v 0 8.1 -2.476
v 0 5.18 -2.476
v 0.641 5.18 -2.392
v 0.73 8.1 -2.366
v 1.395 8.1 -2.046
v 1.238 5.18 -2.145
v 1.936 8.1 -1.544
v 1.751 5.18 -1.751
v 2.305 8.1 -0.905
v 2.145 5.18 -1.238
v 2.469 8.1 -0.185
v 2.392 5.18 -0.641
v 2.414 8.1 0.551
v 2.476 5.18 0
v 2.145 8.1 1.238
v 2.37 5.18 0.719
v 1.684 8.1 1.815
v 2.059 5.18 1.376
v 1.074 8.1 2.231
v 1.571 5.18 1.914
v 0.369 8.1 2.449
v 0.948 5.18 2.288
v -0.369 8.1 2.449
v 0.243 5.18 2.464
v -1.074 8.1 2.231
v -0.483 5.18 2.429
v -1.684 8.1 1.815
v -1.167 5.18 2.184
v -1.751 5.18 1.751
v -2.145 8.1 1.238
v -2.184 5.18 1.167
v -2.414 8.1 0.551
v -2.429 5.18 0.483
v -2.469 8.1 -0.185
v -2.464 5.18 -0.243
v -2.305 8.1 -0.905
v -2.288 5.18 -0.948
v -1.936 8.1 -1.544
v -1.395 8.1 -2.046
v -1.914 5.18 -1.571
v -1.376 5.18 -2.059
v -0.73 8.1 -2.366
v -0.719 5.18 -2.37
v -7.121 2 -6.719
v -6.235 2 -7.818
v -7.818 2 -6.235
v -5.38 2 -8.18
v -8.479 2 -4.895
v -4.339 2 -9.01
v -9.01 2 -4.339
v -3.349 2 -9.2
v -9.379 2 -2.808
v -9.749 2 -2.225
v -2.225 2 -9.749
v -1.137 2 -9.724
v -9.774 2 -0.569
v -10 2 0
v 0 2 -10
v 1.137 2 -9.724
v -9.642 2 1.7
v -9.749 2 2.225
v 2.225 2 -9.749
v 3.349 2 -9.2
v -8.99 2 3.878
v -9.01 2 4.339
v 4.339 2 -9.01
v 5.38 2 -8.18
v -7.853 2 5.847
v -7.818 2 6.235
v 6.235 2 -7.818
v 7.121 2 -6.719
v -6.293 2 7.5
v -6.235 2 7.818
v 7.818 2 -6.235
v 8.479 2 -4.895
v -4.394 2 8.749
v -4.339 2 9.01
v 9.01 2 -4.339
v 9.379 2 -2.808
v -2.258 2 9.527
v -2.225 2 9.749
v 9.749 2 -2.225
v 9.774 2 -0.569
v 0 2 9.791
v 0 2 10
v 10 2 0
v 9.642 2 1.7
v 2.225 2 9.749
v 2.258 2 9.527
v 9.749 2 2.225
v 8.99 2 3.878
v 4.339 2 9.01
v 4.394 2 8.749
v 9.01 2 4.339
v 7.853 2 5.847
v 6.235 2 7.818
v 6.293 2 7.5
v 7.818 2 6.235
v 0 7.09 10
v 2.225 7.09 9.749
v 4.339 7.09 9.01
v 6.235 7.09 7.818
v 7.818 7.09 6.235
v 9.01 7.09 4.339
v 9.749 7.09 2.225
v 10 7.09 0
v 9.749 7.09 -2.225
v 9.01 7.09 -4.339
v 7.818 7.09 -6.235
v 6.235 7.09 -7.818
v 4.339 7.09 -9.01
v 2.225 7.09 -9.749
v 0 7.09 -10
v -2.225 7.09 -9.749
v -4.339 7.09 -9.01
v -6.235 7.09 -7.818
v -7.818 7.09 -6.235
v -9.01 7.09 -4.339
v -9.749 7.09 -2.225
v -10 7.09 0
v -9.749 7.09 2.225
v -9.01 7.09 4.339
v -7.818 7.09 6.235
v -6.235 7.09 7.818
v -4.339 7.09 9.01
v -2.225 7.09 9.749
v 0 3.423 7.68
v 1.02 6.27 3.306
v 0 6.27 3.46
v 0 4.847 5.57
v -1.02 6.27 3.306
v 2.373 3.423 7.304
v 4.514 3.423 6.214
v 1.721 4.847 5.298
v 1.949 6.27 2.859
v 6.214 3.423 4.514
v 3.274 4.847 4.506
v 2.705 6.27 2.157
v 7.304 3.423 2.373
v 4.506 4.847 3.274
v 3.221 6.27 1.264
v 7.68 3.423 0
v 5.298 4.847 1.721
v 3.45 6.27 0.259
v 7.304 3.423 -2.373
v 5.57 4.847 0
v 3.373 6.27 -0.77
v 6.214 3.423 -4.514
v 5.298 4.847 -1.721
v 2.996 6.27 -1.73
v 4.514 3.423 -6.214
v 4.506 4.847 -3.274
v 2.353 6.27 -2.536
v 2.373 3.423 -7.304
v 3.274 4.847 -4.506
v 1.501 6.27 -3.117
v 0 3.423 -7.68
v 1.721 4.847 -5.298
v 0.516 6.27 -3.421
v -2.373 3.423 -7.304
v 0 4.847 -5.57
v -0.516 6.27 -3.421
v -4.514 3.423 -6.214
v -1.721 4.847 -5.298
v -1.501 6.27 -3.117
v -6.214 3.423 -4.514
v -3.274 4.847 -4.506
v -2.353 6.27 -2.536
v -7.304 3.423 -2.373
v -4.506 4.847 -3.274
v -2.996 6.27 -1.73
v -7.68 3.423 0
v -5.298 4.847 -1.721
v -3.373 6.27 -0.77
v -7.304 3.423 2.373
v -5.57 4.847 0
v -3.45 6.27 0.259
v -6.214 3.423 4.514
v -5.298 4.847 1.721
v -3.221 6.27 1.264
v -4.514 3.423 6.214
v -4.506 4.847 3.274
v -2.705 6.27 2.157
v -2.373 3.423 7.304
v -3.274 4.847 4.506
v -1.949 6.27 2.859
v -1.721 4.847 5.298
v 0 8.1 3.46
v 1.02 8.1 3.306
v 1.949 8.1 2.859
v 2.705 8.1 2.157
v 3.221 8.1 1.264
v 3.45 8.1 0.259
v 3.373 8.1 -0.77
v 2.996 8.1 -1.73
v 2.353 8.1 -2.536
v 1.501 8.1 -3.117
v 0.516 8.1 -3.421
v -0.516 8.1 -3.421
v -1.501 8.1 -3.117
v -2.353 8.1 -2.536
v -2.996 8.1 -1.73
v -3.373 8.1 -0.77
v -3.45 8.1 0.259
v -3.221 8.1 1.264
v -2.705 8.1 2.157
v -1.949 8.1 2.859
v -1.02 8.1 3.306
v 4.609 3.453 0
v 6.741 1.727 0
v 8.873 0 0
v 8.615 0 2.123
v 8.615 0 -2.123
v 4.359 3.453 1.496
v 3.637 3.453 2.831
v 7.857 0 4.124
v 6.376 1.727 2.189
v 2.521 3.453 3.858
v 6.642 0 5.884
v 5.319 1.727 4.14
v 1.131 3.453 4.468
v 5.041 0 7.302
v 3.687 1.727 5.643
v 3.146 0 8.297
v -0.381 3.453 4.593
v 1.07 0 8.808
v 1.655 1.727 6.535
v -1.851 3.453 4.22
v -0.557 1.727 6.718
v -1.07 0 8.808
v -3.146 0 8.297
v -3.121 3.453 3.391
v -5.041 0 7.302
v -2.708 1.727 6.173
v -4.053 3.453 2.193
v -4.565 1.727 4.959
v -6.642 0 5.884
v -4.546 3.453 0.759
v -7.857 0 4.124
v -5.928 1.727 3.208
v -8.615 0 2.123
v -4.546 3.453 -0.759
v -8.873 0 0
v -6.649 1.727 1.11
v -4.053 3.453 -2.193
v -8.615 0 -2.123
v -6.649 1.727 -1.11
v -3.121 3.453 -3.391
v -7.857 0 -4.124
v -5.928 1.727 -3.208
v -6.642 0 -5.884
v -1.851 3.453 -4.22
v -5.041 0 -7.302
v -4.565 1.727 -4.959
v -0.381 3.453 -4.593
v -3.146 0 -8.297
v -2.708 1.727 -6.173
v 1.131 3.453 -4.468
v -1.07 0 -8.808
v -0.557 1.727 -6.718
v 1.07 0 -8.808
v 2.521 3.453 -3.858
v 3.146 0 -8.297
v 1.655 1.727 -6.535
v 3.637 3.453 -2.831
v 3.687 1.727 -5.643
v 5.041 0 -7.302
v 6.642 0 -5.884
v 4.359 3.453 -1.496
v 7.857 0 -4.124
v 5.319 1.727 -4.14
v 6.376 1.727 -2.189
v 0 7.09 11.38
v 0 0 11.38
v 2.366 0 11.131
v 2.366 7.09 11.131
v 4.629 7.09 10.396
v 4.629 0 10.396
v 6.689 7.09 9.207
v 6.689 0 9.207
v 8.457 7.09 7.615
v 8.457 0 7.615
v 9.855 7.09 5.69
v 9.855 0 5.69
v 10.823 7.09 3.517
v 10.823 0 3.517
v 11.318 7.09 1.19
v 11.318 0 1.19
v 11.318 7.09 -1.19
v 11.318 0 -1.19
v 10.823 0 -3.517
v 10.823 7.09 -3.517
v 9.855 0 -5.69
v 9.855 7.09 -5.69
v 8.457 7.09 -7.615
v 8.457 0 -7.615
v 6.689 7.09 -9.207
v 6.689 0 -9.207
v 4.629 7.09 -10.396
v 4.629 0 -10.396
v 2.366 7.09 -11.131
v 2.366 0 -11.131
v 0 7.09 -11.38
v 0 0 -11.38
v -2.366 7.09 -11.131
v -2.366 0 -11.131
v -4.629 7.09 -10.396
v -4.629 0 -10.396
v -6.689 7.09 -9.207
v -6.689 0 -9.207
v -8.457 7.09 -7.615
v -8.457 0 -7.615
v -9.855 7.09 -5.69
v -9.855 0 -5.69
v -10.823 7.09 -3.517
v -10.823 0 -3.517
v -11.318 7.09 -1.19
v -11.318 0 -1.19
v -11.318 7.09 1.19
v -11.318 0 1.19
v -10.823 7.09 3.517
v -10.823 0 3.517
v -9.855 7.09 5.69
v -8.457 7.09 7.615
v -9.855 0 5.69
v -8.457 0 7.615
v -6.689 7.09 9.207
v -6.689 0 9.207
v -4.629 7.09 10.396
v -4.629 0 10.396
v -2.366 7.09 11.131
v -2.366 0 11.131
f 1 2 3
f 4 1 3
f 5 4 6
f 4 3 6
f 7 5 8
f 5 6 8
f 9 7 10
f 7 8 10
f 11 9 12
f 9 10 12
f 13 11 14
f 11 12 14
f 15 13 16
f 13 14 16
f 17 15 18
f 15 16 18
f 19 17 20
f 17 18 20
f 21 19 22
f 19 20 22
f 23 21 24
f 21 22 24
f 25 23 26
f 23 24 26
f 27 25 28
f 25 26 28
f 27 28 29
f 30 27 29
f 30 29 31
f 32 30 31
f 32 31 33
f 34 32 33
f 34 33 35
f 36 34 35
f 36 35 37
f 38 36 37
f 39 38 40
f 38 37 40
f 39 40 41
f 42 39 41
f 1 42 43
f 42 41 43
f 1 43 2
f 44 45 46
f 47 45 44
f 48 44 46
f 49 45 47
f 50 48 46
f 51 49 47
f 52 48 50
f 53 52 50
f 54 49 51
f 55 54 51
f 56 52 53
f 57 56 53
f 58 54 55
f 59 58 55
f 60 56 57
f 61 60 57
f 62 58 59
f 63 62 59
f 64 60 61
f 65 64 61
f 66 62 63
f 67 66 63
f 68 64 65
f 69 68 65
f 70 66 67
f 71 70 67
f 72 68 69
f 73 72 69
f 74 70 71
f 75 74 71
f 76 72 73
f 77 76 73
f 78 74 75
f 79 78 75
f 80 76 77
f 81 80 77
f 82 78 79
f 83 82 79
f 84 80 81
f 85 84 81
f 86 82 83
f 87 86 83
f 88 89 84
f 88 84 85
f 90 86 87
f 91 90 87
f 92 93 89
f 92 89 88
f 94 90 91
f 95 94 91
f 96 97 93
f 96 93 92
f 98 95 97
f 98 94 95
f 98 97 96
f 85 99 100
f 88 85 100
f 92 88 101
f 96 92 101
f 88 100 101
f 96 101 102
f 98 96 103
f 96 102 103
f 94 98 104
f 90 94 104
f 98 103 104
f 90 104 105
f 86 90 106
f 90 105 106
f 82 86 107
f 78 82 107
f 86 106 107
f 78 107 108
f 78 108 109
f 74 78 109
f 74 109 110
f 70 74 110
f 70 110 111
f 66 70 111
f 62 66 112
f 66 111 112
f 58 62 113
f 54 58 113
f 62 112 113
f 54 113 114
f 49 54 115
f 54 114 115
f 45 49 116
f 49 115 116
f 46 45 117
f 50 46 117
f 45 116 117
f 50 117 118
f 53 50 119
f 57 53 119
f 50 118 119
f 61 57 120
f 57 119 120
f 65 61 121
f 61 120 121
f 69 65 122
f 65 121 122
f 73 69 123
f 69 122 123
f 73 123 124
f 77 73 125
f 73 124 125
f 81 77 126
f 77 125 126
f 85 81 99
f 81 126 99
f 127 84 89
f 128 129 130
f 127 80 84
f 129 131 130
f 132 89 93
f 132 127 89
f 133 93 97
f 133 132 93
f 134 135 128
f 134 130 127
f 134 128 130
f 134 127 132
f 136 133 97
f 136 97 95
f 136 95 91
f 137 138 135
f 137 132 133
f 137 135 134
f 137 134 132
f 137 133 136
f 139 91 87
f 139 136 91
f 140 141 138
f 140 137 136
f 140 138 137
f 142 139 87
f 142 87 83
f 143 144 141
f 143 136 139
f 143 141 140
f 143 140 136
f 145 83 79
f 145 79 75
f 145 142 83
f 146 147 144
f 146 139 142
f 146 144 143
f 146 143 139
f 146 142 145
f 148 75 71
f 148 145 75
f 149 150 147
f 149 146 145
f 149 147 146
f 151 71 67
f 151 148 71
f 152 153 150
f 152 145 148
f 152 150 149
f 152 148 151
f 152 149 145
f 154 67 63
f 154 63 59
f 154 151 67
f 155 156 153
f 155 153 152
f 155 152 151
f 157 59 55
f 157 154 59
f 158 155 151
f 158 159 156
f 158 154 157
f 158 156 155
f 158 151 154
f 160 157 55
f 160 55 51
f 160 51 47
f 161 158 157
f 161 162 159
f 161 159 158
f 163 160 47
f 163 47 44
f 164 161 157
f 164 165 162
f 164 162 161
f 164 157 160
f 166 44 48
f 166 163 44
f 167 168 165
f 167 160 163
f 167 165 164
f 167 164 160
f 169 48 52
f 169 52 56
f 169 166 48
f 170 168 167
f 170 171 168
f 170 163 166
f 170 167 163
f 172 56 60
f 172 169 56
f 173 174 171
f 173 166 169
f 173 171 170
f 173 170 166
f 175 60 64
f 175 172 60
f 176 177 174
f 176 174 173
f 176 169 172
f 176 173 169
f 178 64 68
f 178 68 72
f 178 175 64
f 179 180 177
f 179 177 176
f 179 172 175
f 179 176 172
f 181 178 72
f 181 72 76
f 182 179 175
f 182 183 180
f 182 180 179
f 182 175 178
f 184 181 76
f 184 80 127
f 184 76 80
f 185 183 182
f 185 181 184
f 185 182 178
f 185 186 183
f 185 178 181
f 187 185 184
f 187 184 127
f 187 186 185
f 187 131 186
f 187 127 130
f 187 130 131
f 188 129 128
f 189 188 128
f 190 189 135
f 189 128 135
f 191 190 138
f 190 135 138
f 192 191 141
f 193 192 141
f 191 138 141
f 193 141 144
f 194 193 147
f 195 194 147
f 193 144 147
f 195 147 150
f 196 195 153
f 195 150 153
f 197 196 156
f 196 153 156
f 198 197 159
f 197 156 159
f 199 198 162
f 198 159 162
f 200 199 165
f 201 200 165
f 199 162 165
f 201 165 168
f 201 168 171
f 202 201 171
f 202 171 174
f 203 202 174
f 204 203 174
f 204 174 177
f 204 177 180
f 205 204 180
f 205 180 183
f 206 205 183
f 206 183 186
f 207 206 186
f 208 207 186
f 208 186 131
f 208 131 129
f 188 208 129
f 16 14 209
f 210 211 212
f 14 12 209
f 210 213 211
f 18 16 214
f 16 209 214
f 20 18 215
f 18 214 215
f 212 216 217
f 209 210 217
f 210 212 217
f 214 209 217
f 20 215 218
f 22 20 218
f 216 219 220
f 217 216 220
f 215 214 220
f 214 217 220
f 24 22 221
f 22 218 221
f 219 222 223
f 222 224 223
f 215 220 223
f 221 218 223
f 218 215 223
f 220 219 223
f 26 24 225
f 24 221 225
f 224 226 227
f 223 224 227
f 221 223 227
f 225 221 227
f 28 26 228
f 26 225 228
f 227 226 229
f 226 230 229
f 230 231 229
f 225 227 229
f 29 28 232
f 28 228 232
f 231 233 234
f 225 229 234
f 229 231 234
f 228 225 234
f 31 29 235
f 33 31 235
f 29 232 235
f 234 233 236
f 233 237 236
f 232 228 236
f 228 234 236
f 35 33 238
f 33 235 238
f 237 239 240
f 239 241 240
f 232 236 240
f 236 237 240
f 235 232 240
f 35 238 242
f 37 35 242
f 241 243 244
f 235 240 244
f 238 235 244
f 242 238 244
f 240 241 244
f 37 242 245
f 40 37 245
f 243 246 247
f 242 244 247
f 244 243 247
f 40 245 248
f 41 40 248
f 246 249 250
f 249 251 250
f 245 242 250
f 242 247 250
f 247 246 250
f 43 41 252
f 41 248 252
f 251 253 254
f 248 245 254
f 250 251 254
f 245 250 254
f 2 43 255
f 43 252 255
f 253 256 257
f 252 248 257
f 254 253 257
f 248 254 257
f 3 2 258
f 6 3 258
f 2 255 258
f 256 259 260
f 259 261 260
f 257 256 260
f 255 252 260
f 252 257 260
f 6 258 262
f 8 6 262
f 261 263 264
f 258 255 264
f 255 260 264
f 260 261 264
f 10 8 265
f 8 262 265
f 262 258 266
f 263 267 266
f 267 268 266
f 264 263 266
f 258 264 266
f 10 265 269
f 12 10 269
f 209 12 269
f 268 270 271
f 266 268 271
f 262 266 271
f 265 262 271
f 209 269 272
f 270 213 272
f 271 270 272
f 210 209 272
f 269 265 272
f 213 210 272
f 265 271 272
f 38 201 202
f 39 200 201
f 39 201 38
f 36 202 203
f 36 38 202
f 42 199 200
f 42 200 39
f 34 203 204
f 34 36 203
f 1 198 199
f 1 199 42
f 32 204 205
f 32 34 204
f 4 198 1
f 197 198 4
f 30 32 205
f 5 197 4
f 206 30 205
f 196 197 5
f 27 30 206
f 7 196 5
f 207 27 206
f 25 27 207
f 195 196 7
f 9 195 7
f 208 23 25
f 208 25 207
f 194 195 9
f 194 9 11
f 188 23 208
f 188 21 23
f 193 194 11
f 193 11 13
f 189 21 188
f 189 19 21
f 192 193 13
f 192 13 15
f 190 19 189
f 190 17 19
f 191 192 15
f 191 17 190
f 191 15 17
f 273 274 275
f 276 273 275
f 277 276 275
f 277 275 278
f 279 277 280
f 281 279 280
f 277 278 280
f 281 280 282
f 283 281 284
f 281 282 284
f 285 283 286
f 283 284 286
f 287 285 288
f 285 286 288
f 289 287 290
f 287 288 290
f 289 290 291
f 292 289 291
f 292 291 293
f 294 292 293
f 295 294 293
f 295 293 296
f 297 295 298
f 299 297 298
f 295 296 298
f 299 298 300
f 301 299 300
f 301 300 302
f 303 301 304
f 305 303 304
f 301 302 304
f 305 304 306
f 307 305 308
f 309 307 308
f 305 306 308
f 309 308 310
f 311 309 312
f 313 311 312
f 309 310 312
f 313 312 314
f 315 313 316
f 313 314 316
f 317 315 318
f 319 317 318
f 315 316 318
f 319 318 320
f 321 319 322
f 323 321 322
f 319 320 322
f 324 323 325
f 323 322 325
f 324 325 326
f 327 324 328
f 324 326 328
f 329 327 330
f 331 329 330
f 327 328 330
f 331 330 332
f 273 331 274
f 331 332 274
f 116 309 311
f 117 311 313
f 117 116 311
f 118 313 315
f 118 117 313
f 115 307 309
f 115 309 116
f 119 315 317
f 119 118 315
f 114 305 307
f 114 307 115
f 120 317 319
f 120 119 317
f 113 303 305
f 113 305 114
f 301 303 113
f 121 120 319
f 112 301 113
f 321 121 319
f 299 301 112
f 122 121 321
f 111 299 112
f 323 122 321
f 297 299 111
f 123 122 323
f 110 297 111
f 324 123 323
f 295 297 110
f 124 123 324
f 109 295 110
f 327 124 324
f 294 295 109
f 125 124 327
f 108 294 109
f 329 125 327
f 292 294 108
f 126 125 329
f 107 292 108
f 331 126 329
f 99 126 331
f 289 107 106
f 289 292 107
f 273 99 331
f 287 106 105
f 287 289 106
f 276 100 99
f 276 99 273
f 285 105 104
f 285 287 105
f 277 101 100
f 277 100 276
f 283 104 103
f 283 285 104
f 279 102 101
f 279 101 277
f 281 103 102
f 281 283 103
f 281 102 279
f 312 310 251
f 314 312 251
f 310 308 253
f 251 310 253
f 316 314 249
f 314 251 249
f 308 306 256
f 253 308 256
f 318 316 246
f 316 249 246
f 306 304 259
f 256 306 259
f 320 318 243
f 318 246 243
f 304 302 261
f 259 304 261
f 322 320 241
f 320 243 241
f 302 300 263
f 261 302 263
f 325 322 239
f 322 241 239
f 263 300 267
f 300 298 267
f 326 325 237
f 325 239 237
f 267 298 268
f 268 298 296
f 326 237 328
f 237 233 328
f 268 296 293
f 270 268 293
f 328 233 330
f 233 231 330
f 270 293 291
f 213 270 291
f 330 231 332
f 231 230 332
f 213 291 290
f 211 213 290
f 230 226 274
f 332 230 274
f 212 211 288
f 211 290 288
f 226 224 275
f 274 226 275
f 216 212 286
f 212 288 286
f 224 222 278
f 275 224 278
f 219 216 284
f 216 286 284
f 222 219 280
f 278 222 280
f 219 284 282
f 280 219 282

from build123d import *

# Parameters (mm, degrees)
SKETCH_1_R          = 11.38
EXTRUDE_1_DEPTH     = 7.09
SKETCH_2_R          = 10
CUT_EXTRUDE_1_DEPTH = 5.09
SKETCH_3_R          = 3.46
EXTRUDE_2_DEPTH     = 6.1
SKETCH_4_R          = 3.46
EXTRUDE_3_DEPTH     = 5.18
EXTRUDE_3_DRAFT     = 56
SKETCH_5_R          = 8.873129811
CUT_EXTRUDE_2_DEPTH = 5.18
CUT_EXTRUDE_2_DRAFT = -51
SKETCH_6_R          = 2.476362541
CUT_EXTRUDE_3_DEPTH = 3.92


with BuildPart() as part:
    # 草图1 → 凸台-拉伸1 (new body)
    with BuildSketch(Plane(origin=(0, 0, 0), x_dir=(1, 0, 0), z_dir=(0, 1, 0))):
        with Locations(Location((0, 0, 0), (0, 0, 270))):  # turned: the seam where the file's is
            Circle(SKETCH_1_R)
    extrude(amount=EXTRUDE_1_DEPTH)

    # 草图2 → 切除-拉伸1 (cut)
    with BuildSketch(Plane(origin=(0, 7.09, 0), x_dir=(1, 0, 0), z_dir=(0, 1, 0))):
        with Locations(Location((0, 0, 0), (0, 0, 270))):  # turned: the seam where the file's is
            Circle(SKETCH_2_R)
    extrude(amount=-CUT_EXTRUDE_1_DEPTH, mode=Mode.SUBTRACT)

    # 草图3 → 凸台-拉伸2 (add)
    with BuildSketch(Plane(origin=(0, 2, 0), x_dir=(1, 0, 0), z_dir=(0, 1, 0))):
        with Locations(Location((0, 0, 0), (0, 0, 270))):  # turned: the seam where the file's is
            Circle(SKETCH_3_R)
    extrude(amount=EXTRUDE_2_DEPTH)


with BuildPart() as extrude_3_tool:
    # 草图4 → 凸台-拉伸3 (with draft: the straight prism first)
    with BuildSketch(Plane(origin=(0, 6.27, 0), x_dir=(1, 0, 0), z_dir=(0, 1, 0))):
        with Locations(Location((0, 0, 0), (0, 0, 270))):  # turned: the seam where the file's is
            Circle(SKETCH_4_R)
    extrude(amount=-EXTRUDE_3_DEPTH)
    # 凸台-拉伸3: the draft: its side faces are tilted about the plane it starts from
    extrude_3_sides = [extrude_3_tool.faces().sort_by_distance(p)[0] for p in [
        (0, 3.68, -3.46),
    ]]
    draft(extrude_3_sides, Plane(origin=(0, 6.27, 0), x_dir=(1, 0, 0), z_dir=(0, 1, 0)), EXTRUDE_3_DRAFT)


with BuildPart() as part_1:
    add(part.part)

    # 凸台-拉伸3: add extrude_3_tool
    add(extrude_3_tool.part)


with BuildPart() as cut_extrude_2_tool:
    # 草图5 → 切除-拉伸2 (with draft: the straight prism first)
    with BuildSketch(Plane.XZ):
        Circle(SKETCH_5_R)
    extrude(amount=-CUT_EXTRUDE_2_DEPTH)
    # 切除-拉伸2: the draft: its side faces are tilted about the plane it starts from
    cut_extrude_2_sides = [cut_extrude_2_tool.faces().sort_by_distance(p)[0] for p in [
        (-8.873129811, 2.59, 0),
    ]]
    draft(cut_extrude_2_sides, Plane.XZ, CUT_EXTRUDE_2_DRAFT)


with BuildPart() as part_2:
    add(part_1.part)

    # 切除-拉伸2: cut by cut_extrude_2_tool
    add(cut_extrude_2_tool.part, mode=Mode.SUBTRACT)

    # 草图6 → 切除-拉伸3 (cut, through all)
    with BuildSketch(Plane.XZ.offset(-5.18)):
        with Locations(Location((0, 0, 0), (0, 0, 270))):  # turned: the seam where the file's is
            Circle(SKETCH_6_R)
    extrude(amount=-CUT_EXTRUDE_3_DEPTH, mode=Mode.SUBTRACT)


solid = part_2.part
